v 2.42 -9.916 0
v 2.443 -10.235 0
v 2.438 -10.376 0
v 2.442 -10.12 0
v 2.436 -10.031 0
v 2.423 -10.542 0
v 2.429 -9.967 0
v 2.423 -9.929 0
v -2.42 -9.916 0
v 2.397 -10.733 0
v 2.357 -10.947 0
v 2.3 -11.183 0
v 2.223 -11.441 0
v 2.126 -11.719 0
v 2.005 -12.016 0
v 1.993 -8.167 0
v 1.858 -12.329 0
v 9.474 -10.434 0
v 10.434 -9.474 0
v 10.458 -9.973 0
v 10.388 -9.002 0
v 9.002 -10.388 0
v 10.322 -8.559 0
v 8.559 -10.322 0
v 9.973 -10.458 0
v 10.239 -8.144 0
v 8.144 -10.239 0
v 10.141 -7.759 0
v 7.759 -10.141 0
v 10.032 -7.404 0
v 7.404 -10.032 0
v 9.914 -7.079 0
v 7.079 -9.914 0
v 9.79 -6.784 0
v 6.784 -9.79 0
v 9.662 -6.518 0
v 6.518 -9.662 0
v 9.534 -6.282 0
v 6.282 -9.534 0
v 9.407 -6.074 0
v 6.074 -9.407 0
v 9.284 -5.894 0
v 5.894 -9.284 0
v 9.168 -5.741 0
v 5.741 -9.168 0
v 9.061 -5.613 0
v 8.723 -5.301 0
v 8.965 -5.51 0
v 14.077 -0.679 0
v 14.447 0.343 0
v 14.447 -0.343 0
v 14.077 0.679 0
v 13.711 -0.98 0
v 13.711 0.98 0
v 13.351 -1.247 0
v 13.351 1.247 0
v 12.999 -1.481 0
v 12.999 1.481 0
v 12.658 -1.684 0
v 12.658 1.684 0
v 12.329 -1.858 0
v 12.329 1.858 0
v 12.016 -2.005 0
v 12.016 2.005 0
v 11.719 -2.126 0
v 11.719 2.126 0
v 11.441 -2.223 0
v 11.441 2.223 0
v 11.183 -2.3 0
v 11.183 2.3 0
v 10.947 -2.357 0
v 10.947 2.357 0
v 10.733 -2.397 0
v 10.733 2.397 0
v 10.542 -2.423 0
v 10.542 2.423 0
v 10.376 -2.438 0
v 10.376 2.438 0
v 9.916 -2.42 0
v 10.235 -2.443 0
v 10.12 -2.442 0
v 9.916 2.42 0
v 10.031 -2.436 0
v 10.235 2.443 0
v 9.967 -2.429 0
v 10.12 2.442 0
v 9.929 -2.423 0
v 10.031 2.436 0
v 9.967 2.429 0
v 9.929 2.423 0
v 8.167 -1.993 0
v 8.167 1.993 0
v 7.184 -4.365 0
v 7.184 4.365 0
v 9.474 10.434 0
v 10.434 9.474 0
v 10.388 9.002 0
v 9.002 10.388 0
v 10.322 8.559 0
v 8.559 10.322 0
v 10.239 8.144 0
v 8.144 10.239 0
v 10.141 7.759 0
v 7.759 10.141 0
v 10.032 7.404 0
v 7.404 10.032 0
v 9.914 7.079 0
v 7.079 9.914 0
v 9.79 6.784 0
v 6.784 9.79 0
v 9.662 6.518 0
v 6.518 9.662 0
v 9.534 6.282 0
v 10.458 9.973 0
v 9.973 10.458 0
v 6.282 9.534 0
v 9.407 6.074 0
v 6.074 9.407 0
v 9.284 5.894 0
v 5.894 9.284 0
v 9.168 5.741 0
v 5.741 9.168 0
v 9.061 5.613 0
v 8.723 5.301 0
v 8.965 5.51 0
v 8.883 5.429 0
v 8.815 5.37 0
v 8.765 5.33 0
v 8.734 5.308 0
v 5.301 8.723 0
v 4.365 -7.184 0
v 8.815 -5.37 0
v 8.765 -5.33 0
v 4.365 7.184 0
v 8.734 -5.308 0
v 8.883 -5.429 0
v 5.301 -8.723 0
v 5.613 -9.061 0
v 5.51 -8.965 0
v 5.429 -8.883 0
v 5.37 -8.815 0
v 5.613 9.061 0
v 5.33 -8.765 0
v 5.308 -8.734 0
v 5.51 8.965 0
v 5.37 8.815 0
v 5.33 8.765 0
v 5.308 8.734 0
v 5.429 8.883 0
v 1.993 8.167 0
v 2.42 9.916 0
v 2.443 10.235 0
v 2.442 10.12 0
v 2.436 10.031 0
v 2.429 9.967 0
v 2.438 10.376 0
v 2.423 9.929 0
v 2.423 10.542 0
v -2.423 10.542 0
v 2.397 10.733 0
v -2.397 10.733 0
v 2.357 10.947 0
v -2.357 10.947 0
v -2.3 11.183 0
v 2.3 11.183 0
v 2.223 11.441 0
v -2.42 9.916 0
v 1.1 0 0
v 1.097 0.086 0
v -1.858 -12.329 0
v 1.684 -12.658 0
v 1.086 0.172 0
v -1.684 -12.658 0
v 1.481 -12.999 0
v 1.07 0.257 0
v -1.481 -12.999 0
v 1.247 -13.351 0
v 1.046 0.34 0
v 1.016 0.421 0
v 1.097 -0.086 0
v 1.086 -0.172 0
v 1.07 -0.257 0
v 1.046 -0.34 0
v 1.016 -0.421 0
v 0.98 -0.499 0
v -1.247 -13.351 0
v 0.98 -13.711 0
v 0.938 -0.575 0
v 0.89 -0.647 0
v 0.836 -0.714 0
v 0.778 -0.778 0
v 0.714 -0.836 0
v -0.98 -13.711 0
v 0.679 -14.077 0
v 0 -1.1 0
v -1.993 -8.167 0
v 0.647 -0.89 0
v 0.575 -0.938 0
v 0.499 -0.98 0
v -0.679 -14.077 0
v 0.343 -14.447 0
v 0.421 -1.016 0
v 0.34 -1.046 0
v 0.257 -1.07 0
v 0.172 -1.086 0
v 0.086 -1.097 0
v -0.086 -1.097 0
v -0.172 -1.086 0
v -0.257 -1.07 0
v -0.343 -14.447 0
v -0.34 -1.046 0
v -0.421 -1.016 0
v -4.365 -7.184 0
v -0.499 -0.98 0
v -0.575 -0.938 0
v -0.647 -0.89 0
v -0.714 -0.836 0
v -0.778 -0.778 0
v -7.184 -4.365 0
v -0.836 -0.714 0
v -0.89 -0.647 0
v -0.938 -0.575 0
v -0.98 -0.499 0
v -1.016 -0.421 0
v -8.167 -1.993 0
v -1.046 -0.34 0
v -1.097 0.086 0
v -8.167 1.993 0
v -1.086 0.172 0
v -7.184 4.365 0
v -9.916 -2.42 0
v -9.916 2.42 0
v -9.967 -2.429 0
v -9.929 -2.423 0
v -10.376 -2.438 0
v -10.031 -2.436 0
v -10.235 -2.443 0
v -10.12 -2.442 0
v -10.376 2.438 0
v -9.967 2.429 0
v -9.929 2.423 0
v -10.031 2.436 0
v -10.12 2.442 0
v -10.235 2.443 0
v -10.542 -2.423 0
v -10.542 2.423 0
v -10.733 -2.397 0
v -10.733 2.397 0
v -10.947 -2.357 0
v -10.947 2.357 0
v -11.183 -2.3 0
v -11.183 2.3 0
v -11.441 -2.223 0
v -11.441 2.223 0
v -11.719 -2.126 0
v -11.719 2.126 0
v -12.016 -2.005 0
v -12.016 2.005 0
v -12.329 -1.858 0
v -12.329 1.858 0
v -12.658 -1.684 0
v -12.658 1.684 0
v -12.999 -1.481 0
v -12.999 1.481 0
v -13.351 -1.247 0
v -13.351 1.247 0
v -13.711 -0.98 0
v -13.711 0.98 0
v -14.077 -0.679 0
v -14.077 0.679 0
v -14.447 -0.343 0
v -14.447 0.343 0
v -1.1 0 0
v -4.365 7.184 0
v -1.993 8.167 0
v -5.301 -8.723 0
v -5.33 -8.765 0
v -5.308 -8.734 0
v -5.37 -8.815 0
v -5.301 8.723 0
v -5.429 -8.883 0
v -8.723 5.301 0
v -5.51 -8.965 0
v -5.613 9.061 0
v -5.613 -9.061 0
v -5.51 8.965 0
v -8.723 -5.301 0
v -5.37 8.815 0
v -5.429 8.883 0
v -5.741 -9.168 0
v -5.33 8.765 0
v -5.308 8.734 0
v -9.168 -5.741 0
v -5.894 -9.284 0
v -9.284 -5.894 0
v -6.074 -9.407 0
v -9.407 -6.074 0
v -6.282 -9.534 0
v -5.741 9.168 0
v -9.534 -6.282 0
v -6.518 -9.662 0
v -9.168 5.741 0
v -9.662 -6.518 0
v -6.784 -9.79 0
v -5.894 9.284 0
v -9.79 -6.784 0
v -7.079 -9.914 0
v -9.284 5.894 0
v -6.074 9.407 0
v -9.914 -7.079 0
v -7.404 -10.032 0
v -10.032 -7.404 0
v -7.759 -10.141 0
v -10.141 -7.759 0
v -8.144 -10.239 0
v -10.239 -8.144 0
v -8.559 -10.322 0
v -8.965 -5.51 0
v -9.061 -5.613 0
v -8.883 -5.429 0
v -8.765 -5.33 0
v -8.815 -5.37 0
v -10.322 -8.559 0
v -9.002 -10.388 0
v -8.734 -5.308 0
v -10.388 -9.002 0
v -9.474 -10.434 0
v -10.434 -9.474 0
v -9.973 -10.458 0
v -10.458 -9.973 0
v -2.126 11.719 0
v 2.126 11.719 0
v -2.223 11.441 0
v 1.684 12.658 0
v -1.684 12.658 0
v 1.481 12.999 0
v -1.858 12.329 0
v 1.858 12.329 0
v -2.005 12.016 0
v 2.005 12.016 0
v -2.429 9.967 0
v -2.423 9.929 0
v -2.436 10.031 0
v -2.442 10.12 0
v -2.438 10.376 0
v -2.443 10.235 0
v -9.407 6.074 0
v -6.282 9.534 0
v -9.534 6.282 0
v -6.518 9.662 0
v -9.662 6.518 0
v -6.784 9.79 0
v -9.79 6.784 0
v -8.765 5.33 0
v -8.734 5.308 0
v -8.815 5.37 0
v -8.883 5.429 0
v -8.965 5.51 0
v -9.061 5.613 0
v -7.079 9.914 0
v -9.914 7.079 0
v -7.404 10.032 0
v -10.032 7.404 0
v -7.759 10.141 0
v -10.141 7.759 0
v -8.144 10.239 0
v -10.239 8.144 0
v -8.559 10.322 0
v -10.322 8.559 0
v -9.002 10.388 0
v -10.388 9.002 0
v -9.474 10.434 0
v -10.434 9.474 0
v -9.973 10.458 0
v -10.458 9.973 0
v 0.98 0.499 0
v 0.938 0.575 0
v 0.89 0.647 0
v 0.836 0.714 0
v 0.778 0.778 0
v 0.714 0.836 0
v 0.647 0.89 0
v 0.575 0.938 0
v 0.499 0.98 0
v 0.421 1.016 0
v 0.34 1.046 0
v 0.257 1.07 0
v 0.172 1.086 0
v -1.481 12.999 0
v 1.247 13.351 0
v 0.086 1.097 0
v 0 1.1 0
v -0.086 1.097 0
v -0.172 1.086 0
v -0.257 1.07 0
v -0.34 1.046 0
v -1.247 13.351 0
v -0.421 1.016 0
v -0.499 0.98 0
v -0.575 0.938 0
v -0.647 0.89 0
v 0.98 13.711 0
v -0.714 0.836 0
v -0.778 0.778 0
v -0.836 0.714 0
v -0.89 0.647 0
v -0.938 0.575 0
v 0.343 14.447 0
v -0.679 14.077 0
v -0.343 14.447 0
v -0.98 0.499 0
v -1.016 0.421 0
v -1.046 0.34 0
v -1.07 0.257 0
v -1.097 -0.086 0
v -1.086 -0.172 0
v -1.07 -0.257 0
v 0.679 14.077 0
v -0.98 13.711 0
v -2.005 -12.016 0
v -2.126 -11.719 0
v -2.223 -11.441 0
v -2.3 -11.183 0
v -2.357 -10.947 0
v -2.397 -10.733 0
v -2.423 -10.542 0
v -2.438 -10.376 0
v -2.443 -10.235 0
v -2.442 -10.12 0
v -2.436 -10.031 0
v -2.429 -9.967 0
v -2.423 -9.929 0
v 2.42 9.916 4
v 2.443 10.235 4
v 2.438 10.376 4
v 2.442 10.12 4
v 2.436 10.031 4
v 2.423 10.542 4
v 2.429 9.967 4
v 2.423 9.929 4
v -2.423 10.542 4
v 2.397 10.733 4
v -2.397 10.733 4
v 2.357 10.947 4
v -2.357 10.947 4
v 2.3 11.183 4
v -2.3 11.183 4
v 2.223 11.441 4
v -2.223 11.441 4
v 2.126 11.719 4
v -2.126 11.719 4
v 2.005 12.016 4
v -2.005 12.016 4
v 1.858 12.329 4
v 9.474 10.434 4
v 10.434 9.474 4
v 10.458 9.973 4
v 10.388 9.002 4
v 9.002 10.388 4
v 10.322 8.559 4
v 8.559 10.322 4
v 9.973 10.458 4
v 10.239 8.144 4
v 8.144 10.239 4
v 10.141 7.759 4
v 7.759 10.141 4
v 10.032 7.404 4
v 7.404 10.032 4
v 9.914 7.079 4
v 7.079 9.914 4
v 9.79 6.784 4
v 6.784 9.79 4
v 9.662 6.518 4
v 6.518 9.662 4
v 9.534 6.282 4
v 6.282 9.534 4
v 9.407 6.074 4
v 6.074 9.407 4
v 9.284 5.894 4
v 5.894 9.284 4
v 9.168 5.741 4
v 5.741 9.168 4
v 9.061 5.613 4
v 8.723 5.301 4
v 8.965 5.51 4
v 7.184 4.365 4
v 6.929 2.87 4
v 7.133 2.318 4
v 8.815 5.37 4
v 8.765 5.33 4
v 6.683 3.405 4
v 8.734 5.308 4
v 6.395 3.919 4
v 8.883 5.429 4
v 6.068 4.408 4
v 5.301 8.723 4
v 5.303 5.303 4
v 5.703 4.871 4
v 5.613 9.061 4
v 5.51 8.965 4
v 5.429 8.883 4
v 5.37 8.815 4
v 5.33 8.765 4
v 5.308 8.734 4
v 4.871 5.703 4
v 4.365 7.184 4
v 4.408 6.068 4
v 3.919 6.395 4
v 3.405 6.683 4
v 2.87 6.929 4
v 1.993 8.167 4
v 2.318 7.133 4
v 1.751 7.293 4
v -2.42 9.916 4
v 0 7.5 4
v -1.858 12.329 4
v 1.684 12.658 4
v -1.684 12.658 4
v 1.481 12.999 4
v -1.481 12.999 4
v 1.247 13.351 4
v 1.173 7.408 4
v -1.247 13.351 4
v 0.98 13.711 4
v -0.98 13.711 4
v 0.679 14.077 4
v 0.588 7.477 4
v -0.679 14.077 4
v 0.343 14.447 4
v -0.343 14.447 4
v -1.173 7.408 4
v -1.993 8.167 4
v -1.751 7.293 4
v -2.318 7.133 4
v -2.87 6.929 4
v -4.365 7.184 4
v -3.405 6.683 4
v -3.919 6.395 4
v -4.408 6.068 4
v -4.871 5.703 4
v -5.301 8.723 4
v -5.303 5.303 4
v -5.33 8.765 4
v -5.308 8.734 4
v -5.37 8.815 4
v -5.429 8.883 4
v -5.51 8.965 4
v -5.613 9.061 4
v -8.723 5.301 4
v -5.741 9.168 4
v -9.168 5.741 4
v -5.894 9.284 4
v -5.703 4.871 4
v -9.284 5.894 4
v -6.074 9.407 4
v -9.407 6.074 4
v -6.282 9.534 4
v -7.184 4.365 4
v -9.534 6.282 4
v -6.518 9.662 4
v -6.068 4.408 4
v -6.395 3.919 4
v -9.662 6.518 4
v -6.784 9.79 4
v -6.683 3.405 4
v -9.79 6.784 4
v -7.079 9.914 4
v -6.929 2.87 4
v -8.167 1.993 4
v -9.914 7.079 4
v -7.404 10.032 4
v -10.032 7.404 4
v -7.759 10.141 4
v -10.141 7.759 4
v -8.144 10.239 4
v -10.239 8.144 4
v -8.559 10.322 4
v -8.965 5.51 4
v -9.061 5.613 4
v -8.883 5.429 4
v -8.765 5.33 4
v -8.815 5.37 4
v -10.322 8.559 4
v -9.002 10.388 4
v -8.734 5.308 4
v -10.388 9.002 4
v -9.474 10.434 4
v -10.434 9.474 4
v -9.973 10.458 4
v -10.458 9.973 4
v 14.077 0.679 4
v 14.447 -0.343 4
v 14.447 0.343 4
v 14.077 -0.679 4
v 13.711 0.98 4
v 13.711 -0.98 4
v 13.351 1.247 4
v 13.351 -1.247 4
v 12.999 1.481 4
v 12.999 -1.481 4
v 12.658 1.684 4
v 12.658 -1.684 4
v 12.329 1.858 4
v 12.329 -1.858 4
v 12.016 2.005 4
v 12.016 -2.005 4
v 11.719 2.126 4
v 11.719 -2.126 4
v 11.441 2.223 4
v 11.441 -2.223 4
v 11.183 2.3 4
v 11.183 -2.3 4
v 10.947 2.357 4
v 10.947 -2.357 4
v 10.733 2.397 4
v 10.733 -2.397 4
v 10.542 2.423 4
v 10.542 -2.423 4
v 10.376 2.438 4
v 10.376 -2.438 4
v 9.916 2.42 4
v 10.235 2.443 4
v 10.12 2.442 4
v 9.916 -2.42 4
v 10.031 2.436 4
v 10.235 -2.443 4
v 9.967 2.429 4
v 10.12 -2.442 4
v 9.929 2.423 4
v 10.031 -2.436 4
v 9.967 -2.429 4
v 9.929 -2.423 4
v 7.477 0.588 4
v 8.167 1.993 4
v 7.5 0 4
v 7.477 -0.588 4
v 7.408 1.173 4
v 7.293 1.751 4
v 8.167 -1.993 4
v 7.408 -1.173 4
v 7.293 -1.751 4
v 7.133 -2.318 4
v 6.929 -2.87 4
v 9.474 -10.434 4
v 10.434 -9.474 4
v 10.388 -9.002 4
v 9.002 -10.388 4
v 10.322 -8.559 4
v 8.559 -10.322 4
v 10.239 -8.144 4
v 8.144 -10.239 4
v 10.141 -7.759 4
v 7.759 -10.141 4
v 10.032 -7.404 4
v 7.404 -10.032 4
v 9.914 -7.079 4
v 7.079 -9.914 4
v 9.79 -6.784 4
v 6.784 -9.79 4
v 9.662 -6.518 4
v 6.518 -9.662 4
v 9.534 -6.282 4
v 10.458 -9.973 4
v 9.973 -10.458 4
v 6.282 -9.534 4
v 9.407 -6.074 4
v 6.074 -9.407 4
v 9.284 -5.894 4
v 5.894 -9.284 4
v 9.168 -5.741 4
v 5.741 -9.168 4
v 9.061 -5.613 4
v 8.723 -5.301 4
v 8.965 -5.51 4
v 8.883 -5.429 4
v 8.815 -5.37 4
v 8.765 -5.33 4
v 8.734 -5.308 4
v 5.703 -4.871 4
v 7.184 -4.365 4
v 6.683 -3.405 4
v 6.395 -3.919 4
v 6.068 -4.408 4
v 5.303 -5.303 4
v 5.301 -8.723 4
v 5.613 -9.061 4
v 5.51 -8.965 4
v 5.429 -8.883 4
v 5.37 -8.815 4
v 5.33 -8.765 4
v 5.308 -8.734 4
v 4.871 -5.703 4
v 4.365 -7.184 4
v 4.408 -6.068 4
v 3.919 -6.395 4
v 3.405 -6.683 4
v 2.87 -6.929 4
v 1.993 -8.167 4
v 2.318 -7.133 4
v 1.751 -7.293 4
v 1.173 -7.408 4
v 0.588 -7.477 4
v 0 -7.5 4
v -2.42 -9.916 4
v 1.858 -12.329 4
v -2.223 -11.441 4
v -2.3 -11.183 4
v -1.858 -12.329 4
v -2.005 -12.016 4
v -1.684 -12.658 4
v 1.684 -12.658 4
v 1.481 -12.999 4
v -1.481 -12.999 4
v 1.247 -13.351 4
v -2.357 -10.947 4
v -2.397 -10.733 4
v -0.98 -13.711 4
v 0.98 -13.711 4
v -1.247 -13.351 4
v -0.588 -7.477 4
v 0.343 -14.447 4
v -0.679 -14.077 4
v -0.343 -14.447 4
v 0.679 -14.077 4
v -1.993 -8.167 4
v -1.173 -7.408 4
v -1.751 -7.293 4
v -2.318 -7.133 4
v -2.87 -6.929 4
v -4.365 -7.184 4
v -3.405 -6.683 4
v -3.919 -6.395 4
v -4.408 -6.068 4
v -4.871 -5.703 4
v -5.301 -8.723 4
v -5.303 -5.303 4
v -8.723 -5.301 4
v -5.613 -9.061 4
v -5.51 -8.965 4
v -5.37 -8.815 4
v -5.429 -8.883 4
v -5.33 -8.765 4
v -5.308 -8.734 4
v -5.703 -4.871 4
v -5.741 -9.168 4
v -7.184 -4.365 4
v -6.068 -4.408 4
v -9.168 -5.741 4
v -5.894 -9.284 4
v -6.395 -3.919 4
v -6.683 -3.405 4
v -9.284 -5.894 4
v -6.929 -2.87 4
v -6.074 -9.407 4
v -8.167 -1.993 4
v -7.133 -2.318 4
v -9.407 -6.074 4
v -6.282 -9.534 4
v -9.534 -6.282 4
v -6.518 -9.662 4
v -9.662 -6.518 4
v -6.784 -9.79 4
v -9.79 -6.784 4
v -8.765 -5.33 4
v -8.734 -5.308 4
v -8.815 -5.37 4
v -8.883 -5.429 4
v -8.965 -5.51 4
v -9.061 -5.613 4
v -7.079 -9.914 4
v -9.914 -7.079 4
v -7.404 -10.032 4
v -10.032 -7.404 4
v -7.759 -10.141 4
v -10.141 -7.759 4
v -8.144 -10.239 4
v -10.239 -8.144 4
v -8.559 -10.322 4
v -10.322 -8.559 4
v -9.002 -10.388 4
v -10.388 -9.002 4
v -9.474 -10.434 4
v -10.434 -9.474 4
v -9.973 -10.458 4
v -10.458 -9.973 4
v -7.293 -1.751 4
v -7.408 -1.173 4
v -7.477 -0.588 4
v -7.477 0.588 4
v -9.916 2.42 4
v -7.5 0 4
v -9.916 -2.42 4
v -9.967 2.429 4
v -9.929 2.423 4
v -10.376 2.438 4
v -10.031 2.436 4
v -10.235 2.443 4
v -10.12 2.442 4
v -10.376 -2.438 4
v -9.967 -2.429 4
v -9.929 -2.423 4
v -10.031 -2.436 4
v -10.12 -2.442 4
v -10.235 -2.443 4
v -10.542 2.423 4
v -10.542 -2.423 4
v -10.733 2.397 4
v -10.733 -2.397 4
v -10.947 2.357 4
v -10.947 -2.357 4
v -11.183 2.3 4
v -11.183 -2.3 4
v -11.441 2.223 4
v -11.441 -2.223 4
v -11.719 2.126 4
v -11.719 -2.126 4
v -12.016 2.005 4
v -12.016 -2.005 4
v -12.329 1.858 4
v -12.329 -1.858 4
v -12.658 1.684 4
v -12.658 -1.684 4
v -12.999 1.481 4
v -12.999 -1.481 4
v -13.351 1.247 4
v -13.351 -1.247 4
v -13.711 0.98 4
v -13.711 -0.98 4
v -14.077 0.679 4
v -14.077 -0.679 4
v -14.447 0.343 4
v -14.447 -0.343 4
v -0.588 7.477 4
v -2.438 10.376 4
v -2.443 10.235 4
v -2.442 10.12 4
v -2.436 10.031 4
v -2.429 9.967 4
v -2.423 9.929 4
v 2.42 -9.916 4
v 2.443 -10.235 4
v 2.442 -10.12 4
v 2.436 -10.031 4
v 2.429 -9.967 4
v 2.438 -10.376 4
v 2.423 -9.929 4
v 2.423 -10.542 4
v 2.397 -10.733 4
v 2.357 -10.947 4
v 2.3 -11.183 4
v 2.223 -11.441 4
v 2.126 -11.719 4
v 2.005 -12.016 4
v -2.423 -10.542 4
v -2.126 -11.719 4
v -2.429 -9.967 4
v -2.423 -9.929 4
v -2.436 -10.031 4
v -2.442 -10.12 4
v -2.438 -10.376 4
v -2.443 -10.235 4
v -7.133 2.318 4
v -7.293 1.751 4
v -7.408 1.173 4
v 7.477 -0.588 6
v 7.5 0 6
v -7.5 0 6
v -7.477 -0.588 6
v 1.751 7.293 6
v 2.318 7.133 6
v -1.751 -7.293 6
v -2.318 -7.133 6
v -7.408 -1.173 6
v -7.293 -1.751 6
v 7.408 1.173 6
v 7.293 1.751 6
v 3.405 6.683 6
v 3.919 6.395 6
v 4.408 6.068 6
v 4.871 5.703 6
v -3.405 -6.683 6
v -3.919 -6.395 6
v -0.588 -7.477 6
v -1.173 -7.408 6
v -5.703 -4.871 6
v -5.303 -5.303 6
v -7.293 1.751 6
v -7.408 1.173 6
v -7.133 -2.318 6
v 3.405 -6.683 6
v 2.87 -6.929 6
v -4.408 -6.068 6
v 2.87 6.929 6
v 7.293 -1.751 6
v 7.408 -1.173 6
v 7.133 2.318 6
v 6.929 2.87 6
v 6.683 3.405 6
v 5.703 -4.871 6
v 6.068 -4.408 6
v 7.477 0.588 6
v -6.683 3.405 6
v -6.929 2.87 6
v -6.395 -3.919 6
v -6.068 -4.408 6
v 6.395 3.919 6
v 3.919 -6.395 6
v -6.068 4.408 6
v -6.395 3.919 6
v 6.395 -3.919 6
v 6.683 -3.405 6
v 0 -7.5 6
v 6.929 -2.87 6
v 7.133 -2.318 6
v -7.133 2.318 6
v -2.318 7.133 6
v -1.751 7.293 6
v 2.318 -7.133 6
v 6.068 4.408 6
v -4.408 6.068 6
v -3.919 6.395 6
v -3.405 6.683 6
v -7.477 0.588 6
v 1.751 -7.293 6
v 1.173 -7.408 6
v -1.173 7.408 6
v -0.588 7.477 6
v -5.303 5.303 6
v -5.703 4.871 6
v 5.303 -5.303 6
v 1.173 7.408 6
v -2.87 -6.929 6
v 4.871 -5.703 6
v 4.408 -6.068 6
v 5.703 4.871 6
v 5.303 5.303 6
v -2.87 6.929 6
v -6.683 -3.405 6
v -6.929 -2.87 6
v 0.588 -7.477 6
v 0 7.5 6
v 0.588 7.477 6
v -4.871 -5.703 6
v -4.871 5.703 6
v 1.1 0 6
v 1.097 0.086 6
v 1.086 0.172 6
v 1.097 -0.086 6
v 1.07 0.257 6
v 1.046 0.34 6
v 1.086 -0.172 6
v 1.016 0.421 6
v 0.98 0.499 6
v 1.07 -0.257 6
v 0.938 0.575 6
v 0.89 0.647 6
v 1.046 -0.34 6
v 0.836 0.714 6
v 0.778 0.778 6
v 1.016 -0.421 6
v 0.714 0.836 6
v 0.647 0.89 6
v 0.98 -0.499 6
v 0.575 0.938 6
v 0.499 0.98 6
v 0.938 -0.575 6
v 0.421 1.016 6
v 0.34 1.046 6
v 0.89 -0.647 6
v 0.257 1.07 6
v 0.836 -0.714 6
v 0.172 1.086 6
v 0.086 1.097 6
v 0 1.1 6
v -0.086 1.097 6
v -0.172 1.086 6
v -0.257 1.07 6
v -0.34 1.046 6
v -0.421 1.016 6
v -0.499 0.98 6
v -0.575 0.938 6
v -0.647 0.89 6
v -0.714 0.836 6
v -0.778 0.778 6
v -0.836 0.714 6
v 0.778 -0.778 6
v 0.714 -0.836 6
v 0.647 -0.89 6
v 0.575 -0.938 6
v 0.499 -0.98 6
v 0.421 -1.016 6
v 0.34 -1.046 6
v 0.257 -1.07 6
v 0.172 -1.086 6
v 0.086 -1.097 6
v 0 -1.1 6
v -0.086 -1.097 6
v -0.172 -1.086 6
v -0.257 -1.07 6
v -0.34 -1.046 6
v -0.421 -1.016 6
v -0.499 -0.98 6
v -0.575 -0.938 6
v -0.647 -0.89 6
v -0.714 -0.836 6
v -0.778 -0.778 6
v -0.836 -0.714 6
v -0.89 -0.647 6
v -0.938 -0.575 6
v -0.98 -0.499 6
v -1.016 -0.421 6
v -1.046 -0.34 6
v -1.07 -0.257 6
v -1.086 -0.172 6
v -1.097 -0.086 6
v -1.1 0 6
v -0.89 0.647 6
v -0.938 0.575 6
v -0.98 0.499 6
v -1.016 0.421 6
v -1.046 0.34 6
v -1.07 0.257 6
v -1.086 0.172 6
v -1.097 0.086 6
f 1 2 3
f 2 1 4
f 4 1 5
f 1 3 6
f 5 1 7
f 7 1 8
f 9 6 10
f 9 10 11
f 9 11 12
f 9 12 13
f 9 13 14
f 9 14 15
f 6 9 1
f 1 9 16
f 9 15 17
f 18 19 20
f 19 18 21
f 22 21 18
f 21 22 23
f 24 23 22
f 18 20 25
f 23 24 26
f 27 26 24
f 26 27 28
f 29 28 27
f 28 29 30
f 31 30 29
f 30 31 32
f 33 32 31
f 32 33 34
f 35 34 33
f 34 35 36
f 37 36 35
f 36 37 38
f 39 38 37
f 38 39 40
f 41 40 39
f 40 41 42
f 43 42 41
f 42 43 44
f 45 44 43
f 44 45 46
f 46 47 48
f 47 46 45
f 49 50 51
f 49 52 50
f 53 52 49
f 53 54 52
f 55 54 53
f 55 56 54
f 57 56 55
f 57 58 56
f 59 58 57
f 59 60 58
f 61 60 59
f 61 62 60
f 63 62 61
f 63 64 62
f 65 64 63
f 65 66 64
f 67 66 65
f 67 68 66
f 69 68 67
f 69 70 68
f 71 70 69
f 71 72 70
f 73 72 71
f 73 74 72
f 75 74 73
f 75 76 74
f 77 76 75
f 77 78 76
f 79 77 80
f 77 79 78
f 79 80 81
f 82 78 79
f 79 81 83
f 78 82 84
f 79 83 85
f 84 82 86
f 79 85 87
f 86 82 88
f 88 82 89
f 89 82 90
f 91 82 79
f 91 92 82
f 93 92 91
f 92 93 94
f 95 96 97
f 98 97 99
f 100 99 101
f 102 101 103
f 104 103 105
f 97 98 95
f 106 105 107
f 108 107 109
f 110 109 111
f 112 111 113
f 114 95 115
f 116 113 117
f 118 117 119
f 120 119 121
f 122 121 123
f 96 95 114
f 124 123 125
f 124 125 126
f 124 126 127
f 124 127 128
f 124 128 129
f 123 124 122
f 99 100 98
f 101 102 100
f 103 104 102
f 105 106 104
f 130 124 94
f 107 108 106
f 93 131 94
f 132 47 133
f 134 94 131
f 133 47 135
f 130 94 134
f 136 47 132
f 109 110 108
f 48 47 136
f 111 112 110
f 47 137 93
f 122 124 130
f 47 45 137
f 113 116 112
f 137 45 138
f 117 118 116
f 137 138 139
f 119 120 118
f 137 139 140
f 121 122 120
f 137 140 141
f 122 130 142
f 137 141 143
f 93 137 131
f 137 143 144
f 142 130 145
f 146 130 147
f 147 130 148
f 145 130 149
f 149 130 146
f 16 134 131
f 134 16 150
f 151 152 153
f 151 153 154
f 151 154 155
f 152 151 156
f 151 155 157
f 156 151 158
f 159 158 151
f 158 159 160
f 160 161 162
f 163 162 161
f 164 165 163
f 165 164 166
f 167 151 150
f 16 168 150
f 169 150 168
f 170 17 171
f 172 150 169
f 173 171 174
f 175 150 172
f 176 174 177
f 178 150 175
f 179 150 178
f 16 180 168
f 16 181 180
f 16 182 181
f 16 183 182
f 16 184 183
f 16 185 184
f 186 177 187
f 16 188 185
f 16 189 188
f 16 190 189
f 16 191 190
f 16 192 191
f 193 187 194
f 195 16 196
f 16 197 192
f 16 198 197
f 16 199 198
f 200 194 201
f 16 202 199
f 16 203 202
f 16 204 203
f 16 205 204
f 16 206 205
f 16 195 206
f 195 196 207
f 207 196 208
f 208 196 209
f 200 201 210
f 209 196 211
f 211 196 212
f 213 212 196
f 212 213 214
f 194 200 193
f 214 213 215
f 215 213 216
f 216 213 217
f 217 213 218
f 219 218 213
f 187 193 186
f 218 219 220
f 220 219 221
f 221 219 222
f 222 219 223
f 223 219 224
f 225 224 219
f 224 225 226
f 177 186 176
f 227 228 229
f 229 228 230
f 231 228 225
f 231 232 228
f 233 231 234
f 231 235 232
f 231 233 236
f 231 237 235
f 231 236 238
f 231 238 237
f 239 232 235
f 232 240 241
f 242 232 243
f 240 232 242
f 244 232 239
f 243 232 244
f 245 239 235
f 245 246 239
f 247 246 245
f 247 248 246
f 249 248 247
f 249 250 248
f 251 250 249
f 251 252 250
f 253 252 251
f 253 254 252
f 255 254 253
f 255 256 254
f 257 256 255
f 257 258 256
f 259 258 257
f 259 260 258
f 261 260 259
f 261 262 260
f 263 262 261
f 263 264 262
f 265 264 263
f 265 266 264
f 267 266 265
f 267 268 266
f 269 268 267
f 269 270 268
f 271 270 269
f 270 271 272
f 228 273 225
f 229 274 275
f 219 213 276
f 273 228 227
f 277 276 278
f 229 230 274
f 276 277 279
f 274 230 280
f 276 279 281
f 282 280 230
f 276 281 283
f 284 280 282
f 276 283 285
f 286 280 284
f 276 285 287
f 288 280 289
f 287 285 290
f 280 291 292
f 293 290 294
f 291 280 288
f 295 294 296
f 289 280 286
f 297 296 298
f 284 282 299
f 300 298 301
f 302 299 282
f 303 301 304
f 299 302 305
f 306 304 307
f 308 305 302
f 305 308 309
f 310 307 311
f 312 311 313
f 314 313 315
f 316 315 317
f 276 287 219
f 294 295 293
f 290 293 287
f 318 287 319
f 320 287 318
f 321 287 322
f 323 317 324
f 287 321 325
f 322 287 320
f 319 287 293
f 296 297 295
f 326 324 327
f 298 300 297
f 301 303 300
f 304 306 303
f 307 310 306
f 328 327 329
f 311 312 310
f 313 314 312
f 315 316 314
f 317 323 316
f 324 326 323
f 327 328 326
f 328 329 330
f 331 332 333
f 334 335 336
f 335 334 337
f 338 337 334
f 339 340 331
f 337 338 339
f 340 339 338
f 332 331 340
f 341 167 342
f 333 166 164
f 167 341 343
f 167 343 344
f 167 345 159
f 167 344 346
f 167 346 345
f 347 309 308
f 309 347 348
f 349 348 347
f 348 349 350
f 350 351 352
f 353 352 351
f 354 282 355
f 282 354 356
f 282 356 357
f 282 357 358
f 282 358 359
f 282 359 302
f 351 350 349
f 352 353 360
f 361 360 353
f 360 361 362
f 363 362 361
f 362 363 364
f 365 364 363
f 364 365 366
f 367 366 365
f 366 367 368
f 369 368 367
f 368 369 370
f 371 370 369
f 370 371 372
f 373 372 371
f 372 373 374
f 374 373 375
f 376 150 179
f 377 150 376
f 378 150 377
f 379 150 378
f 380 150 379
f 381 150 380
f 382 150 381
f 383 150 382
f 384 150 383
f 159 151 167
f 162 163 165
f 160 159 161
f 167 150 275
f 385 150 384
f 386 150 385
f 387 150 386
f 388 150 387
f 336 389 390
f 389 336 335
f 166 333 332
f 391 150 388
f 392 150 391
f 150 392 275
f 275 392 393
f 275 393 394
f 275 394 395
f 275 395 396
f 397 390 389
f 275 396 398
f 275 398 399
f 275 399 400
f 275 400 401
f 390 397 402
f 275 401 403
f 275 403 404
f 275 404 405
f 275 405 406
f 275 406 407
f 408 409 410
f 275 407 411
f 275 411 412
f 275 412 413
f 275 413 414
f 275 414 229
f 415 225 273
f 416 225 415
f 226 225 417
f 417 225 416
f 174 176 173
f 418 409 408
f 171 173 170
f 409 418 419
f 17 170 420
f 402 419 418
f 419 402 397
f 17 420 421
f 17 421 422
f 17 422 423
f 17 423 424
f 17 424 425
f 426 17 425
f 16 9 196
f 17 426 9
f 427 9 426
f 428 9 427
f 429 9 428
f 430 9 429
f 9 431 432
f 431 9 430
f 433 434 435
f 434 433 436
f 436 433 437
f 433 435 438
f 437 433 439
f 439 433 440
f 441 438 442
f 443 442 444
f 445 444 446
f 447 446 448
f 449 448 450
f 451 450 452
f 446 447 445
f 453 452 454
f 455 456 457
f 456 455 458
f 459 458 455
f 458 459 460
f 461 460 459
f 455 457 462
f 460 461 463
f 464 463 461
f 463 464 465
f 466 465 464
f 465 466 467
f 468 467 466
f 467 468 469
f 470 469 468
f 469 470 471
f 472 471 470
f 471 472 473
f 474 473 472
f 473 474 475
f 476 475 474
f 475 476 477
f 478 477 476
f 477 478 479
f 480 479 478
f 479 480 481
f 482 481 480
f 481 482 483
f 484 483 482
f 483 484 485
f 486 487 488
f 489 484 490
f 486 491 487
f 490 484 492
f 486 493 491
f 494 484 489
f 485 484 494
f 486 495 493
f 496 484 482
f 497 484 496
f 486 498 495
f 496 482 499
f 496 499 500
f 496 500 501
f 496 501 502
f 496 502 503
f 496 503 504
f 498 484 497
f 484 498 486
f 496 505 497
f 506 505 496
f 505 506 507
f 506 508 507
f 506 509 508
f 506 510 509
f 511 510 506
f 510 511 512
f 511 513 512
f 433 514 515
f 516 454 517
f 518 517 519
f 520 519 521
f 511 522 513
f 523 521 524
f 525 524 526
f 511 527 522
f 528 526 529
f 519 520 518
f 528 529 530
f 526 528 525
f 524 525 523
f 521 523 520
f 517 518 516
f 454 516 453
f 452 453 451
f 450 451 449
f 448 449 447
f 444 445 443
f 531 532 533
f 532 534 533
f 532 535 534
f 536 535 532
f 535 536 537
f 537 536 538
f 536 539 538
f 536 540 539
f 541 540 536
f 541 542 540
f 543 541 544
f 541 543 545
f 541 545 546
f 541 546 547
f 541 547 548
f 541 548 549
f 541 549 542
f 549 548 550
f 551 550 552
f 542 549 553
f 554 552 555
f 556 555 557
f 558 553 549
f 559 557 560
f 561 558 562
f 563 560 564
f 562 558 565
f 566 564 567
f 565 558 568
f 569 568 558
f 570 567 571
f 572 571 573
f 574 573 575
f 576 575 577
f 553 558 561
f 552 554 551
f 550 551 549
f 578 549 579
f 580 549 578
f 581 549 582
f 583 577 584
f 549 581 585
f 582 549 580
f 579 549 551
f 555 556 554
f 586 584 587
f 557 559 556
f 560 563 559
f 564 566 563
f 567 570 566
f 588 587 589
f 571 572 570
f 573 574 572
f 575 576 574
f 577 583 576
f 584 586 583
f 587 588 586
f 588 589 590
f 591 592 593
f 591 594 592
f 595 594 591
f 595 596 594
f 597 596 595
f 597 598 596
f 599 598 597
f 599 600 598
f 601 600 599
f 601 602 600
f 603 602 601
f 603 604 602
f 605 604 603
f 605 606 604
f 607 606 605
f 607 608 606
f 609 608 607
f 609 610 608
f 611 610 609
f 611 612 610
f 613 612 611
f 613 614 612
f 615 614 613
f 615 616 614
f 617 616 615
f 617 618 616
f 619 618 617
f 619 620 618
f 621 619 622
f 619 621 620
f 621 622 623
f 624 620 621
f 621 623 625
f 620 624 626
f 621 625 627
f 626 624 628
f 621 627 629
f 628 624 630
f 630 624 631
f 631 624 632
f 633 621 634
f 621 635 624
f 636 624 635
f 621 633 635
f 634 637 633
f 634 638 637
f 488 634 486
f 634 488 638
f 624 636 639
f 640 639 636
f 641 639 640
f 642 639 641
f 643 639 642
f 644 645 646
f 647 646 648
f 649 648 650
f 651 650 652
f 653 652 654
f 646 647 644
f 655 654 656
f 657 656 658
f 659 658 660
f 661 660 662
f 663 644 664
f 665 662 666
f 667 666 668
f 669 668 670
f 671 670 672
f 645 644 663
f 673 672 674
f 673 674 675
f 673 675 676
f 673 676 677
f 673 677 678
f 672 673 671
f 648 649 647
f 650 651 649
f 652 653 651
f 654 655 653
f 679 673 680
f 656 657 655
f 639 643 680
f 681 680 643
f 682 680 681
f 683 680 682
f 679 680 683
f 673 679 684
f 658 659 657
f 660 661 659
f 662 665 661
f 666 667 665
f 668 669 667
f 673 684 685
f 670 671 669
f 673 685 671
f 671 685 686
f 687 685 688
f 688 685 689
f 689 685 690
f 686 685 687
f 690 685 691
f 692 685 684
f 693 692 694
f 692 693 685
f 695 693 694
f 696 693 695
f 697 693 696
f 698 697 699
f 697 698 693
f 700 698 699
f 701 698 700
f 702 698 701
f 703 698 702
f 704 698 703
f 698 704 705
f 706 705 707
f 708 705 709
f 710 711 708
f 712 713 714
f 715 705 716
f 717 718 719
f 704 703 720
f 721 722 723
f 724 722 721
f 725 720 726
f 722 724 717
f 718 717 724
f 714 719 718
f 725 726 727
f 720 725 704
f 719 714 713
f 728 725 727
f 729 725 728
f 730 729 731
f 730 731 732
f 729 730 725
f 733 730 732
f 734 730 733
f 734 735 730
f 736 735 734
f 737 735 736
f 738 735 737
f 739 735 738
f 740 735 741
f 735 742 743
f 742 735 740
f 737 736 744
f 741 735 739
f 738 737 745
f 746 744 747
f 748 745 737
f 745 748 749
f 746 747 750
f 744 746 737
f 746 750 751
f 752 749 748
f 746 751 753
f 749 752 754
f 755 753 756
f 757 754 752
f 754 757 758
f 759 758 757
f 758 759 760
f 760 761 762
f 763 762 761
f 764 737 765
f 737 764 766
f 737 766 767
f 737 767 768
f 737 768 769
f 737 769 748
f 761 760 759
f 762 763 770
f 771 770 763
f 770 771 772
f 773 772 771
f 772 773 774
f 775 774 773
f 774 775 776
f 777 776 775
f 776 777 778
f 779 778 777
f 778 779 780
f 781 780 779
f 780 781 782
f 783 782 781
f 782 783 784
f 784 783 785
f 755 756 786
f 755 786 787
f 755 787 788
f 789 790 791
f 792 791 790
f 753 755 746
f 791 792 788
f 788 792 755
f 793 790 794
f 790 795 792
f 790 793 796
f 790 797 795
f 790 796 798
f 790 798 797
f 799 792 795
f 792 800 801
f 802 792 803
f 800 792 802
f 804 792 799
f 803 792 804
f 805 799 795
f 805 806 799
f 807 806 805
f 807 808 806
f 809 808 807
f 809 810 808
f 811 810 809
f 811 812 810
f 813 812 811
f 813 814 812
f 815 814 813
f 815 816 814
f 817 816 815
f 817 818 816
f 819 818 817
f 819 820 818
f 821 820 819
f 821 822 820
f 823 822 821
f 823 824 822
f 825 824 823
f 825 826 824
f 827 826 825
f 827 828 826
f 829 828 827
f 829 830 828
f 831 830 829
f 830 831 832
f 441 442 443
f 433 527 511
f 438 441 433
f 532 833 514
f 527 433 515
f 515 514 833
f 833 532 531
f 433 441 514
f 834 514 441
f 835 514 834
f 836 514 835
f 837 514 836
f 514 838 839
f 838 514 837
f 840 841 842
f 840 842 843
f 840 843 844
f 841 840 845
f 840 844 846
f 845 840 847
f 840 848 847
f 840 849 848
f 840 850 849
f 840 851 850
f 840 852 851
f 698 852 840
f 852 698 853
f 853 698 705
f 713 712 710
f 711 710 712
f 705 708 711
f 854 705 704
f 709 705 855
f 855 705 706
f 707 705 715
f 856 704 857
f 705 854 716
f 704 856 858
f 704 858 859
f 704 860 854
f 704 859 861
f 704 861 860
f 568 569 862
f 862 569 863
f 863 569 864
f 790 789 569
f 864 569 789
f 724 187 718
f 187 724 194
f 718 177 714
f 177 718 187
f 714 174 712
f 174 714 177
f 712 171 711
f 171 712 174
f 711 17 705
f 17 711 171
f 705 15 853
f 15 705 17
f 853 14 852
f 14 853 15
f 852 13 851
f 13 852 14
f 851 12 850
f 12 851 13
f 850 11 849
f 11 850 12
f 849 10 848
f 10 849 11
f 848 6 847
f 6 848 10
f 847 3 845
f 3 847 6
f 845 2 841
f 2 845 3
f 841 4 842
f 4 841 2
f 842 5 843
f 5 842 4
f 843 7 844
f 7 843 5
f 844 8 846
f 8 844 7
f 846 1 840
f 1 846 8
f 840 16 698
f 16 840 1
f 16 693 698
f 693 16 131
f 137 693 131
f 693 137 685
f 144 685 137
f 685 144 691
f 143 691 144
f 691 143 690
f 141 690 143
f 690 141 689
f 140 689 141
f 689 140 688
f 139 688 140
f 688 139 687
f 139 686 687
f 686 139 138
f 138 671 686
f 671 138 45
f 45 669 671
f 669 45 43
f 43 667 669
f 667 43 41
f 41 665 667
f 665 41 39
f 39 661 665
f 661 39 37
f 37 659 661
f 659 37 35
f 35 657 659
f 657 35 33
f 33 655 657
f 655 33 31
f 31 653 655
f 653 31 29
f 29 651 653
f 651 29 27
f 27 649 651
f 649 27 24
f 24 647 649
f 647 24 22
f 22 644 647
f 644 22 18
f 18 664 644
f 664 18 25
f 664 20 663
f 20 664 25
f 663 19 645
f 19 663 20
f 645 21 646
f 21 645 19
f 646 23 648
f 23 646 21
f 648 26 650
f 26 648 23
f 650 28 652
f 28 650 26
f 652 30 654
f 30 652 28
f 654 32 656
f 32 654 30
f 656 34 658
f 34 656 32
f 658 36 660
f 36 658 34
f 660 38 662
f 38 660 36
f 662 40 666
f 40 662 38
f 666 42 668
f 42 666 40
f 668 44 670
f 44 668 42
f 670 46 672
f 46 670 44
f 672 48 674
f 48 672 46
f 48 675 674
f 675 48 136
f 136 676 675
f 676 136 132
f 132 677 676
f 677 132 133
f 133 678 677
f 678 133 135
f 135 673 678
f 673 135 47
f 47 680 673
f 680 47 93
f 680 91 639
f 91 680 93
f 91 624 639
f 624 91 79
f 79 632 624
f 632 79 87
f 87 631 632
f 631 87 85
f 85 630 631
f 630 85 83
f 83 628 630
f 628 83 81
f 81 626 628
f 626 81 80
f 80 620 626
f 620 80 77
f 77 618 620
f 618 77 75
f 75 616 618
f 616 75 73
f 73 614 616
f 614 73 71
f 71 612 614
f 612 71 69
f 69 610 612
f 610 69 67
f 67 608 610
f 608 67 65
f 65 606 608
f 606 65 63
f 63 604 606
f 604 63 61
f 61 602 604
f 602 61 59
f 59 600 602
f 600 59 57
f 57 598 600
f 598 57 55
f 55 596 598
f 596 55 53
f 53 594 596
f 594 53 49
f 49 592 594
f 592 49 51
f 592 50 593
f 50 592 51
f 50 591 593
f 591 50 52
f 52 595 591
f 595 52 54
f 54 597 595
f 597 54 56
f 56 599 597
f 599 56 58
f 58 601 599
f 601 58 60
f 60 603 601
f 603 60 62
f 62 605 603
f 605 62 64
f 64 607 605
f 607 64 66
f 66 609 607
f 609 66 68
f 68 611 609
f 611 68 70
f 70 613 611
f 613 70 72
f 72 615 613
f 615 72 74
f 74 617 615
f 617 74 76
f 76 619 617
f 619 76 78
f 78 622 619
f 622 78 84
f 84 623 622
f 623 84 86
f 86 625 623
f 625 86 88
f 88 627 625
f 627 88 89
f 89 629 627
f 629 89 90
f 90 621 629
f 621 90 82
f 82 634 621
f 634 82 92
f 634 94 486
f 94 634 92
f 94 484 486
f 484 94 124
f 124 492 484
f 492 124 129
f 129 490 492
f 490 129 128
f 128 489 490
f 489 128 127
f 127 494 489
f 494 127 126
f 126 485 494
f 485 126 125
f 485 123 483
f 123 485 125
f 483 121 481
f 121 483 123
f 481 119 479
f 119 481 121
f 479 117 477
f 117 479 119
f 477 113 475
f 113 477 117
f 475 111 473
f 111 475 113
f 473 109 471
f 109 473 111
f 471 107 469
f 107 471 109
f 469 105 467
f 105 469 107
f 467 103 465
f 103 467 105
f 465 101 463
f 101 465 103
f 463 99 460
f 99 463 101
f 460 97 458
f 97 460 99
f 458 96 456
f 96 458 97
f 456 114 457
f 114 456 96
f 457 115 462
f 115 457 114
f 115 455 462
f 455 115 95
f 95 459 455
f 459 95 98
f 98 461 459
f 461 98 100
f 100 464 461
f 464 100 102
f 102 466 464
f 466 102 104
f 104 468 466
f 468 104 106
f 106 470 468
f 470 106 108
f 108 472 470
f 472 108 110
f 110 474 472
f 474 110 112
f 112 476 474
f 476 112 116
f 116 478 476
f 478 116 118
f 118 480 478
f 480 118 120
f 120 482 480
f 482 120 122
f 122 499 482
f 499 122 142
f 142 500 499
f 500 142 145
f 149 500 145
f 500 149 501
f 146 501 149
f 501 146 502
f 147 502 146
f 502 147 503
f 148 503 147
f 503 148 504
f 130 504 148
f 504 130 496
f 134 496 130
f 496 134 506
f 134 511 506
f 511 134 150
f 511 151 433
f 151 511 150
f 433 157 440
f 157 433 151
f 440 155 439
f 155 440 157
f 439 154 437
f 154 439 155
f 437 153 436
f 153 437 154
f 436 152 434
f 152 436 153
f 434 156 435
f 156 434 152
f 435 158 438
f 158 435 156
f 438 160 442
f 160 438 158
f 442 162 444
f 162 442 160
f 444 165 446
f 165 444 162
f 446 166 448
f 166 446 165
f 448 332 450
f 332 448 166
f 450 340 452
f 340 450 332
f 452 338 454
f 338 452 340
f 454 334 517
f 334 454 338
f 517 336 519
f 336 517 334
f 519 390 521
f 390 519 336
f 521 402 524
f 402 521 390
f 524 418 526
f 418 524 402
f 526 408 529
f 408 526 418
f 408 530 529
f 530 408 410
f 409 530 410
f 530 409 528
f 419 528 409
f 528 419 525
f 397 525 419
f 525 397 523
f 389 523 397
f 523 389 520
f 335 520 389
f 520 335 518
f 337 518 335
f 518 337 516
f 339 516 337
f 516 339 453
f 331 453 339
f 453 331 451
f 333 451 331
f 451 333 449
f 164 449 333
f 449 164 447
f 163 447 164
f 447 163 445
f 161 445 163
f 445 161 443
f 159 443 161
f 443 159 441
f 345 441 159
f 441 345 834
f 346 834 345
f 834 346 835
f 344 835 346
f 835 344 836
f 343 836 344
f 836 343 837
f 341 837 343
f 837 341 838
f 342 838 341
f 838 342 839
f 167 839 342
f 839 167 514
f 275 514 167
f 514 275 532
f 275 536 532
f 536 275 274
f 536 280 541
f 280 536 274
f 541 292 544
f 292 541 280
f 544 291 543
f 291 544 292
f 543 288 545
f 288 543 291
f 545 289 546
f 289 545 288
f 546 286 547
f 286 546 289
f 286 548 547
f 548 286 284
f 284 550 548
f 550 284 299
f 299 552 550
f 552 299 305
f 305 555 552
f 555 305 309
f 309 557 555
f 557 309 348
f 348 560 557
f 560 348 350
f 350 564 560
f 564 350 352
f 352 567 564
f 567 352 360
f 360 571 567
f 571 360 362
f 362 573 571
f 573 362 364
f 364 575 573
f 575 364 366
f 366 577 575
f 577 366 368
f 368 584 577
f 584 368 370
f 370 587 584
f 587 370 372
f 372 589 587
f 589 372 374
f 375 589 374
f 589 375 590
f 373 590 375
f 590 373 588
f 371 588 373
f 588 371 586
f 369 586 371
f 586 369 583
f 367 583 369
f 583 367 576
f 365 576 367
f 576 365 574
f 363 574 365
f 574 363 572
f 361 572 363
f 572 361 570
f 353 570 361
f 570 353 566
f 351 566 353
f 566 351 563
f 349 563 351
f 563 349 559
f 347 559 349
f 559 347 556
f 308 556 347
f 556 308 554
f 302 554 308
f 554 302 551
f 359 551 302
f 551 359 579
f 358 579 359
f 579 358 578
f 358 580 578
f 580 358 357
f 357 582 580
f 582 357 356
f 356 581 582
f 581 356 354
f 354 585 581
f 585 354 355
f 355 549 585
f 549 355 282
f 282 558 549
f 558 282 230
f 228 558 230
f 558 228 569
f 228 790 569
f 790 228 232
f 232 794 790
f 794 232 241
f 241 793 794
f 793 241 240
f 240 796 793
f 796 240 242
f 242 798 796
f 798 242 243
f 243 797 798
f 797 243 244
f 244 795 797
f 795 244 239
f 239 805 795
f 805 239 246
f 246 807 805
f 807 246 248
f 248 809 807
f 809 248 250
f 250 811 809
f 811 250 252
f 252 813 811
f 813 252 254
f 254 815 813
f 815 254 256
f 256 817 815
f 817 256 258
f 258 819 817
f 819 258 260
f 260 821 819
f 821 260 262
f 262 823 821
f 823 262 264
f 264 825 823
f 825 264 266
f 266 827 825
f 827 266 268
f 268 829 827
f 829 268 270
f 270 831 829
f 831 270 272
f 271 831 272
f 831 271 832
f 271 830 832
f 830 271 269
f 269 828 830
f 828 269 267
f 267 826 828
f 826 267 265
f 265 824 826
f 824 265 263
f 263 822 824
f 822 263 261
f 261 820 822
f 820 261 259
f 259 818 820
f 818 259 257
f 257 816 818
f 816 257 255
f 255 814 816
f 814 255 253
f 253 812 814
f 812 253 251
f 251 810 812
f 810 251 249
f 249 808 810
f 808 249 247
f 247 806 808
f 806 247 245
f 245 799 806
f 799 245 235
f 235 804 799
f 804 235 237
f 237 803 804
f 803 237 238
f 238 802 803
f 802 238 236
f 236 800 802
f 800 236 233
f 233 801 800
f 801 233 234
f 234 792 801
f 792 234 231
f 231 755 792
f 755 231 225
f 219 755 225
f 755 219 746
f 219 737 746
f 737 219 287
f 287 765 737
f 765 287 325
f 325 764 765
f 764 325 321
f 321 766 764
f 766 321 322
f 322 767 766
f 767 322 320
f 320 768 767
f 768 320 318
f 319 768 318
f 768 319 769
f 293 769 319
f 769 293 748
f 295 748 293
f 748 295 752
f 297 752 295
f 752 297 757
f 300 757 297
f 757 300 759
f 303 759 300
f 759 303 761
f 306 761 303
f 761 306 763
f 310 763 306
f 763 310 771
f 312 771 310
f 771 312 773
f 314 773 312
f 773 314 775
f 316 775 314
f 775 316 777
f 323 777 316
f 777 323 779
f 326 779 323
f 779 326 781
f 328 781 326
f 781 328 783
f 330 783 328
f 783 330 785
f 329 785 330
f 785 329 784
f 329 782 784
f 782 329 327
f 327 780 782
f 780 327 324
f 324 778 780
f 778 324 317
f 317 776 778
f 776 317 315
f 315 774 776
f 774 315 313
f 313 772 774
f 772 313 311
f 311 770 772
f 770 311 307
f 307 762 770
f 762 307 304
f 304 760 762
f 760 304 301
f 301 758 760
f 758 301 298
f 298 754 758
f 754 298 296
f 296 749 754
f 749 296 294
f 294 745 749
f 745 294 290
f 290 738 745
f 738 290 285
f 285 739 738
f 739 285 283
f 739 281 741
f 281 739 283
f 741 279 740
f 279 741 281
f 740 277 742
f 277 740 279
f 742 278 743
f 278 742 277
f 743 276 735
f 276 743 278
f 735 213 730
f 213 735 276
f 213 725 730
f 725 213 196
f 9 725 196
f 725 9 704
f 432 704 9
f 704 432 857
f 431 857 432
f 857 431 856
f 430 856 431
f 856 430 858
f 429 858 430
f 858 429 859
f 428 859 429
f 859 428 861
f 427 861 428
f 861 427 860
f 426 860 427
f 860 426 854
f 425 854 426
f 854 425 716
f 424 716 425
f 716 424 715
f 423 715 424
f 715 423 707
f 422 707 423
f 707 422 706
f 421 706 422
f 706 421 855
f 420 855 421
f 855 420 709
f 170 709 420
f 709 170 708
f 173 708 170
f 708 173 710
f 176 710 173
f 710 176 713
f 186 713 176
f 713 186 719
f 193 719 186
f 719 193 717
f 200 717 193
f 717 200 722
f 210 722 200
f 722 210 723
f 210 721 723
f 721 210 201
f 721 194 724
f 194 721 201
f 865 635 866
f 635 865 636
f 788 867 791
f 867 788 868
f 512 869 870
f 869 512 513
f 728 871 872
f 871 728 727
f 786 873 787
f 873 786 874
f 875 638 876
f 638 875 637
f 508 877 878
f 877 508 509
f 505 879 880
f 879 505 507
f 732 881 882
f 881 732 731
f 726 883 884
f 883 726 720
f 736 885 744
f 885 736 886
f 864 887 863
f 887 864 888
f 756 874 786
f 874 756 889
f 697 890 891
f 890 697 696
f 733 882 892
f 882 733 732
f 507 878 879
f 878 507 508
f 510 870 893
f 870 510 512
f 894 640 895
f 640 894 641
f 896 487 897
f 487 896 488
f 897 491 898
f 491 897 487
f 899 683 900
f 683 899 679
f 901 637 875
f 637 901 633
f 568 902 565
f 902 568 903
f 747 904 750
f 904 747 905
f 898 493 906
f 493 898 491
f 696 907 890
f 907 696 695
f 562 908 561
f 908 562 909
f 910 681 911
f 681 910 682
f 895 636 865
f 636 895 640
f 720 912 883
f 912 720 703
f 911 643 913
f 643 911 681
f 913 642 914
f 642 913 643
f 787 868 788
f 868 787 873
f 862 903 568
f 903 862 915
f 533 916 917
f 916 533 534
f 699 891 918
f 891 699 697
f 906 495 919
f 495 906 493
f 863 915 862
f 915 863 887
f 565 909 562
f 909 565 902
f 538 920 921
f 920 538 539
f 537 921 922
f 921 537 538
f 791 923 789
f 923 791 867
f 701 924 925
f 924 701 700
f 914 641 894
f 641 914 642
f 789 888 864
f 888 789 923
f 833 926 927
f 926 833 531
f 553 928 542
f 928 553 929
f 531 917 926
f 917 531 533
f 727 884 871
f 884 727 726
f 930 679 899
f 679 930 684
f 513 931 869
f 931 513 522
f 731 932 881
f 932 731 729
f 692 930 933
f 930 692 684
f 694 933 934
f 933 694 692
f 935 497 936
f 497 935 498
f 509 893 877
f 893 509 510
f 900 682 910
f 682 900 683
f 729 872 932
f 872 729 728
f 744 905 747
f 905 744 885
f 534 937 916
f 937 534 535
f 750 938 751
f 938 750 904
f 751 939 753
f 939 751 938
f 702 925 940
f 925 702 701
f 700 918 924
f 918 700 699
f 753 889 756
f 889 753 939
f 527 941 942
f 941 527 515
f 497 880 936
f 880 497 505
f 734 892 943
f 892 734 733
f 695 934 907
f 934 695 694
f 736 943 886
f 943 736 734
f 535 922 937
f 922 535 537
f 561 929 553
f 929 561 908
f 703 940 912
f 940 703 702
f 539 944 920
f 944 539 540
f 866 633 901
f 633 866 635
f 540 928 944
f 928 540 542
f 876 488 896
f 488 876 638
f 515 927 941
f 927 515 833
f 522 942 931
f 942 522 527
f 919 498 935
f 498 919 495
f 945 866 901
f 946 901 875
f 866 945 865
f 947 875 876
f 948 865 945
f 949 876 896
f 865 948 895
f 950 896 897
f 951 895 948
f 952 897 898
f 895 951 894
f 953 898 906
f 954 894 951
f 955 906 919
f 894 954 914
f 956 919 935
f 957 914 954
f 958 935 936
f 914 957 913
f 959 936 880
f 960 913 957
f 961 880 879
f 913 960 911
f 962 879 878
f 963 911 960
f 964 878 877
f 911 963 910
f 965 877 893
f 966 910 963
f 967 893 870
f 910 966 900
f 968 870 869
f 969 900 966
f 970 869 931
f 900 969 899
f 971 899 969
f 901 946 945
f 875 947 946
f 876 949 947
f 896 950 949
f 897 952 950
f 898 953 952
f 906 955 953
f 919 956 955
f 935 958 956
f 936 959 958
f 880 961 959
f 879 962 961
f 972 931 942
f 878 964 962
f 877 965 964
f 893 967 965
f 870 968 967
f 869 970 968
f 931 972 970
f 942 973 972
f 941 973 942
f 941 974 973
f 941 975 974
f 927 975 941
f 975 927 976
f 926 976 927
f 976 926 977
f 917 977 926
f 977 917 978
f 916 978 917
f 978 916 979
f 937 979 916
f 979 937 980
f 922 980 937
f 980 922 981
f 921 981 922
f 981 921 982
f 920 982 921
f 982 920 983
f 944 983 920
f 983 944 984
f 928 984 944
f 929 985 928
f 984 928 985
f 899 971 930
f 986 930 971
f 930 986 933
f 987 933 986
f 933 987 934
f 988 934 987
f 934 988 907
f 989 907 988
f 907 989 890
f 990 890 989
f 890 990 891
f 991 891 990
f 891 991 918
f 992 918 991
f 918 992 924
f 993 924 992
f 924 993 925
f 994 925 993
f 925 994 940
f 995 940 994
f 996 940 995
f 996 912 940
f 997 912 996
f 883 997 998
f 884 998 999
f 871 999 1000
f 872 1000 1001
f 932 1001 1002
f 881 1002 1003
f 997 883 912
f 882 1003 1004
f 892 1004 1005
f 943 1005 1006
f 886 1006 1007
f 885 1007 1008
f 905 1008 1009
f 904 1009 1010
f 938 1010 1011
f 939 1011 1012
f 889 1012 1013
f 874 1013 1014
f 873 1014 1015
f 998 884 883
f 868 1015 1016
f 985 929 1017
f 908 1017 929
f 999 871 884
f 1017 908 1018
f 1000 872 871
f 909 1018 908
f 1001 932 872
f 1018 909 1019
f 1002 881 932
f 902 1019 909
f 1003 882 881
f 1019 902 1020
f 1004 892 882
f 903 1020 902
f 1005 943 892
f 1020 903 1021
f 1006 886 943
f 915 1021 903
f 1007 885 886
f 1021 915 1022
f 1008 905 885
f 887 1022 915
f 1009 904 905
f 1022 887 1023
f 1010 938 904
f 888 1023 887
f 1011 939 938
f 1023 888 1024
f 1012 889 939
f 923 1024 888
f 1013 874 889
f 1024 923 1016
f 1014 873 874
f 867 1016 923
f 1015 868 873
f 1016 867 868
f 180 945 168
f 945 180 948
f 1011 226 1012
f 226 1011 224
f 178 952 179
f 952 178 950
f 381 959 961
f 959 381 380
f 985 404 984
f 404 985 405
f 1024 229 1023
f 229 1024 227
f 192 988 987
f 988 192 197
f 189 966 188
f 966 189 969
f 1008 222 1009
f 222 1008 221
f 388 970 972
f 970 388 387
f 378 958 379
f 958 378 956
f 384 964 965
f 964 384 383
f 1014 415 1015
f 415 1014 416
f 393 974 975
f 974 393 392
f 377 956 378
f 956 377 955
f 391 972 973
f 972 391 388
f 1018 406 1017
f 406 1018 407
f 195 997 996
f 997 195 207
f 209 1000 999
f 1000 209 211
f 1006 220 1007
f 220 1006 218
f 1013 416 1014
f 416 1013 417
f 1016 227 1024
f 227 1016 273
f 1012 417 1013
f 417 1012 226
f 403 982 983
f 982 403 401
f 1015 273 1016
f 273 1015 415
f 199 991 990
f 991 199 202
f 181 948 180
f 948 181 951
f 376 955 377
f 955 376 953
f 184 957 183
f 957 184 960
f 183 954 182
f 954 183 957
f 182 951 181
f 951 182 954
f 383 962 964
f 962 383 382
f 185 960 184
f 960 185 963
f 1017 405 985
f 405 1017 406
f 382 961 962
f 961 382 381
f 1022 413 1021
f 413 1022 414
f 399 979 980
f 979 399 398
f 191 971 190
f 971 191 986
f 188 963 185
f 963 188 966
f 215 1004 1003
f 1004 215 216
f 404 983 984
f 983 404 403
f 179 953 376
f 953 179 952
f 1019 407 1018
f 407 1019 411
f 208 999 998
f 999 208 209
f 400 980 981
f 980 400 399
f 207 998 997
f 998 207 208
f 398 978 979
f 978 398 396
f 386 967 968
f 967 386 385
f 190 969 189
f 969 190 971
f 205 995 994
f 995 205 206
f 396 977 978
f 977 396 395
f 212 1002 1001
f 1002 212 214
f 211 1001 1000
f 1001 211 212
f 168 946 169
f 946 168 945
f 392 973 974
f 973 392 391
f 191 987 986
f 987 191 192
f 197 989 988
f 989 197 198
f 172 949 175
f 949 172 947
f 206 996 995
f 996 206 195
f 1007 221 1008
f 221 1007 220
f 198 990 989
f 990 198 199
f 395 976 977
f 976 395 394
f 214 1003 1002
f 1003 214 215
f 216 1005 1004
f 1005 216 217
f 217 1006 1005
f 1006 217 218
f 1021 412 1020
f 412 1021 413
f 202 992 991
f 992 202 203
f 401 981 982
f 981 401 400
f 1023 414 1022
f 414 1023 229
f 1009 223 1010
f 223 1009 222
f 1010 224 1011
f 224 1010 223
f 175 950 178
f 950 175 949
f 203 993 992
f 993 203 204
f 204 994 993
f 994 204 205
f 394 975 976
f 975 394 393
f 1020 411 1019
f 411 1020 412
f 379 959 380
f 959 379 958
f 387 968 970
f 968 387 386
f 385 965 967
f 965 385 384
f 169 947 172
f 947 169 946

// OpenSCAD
// file: inc/constants.scad
pi=3.1415;
$fn=80;
//hole radius
hr = 6;

//distance between holes
dh = 12;

//x distance between holes
dhx = 12;

//y distance between holes
dhy = 14.4;
//dhy=20;

//give between two gears
giveg = .5;

//shaft give
sgive = .6;

//plug give
//pgive = .15;

pgive = .12;


//fastener give (holes)
fgive = .13;

pitch=.25;

//gear give (hole)
ggive = .45;

//spacer give
spgive = .3;


////fastener sizes
//notch width
notchw = 0;

//notch height
notchh = 0;

//fastener height
fh = 4;

//fastener width (sans notch)
fw = hr;


//gear hole radius
ghr = 1.4;

//arrow length
al = 8;


//give for the nut
nut_give = .8;
// main file
use <involute_gears.scad>

pitch = .346;
//hole diam
hd = 2;
//bore give
bg = .2;


gear(number_of_teeth=8, diametral_pitch=pitch, gear_thickness=4, rim_thickness=4, hub_thickness=6, bore_diameter=hd+bg);
